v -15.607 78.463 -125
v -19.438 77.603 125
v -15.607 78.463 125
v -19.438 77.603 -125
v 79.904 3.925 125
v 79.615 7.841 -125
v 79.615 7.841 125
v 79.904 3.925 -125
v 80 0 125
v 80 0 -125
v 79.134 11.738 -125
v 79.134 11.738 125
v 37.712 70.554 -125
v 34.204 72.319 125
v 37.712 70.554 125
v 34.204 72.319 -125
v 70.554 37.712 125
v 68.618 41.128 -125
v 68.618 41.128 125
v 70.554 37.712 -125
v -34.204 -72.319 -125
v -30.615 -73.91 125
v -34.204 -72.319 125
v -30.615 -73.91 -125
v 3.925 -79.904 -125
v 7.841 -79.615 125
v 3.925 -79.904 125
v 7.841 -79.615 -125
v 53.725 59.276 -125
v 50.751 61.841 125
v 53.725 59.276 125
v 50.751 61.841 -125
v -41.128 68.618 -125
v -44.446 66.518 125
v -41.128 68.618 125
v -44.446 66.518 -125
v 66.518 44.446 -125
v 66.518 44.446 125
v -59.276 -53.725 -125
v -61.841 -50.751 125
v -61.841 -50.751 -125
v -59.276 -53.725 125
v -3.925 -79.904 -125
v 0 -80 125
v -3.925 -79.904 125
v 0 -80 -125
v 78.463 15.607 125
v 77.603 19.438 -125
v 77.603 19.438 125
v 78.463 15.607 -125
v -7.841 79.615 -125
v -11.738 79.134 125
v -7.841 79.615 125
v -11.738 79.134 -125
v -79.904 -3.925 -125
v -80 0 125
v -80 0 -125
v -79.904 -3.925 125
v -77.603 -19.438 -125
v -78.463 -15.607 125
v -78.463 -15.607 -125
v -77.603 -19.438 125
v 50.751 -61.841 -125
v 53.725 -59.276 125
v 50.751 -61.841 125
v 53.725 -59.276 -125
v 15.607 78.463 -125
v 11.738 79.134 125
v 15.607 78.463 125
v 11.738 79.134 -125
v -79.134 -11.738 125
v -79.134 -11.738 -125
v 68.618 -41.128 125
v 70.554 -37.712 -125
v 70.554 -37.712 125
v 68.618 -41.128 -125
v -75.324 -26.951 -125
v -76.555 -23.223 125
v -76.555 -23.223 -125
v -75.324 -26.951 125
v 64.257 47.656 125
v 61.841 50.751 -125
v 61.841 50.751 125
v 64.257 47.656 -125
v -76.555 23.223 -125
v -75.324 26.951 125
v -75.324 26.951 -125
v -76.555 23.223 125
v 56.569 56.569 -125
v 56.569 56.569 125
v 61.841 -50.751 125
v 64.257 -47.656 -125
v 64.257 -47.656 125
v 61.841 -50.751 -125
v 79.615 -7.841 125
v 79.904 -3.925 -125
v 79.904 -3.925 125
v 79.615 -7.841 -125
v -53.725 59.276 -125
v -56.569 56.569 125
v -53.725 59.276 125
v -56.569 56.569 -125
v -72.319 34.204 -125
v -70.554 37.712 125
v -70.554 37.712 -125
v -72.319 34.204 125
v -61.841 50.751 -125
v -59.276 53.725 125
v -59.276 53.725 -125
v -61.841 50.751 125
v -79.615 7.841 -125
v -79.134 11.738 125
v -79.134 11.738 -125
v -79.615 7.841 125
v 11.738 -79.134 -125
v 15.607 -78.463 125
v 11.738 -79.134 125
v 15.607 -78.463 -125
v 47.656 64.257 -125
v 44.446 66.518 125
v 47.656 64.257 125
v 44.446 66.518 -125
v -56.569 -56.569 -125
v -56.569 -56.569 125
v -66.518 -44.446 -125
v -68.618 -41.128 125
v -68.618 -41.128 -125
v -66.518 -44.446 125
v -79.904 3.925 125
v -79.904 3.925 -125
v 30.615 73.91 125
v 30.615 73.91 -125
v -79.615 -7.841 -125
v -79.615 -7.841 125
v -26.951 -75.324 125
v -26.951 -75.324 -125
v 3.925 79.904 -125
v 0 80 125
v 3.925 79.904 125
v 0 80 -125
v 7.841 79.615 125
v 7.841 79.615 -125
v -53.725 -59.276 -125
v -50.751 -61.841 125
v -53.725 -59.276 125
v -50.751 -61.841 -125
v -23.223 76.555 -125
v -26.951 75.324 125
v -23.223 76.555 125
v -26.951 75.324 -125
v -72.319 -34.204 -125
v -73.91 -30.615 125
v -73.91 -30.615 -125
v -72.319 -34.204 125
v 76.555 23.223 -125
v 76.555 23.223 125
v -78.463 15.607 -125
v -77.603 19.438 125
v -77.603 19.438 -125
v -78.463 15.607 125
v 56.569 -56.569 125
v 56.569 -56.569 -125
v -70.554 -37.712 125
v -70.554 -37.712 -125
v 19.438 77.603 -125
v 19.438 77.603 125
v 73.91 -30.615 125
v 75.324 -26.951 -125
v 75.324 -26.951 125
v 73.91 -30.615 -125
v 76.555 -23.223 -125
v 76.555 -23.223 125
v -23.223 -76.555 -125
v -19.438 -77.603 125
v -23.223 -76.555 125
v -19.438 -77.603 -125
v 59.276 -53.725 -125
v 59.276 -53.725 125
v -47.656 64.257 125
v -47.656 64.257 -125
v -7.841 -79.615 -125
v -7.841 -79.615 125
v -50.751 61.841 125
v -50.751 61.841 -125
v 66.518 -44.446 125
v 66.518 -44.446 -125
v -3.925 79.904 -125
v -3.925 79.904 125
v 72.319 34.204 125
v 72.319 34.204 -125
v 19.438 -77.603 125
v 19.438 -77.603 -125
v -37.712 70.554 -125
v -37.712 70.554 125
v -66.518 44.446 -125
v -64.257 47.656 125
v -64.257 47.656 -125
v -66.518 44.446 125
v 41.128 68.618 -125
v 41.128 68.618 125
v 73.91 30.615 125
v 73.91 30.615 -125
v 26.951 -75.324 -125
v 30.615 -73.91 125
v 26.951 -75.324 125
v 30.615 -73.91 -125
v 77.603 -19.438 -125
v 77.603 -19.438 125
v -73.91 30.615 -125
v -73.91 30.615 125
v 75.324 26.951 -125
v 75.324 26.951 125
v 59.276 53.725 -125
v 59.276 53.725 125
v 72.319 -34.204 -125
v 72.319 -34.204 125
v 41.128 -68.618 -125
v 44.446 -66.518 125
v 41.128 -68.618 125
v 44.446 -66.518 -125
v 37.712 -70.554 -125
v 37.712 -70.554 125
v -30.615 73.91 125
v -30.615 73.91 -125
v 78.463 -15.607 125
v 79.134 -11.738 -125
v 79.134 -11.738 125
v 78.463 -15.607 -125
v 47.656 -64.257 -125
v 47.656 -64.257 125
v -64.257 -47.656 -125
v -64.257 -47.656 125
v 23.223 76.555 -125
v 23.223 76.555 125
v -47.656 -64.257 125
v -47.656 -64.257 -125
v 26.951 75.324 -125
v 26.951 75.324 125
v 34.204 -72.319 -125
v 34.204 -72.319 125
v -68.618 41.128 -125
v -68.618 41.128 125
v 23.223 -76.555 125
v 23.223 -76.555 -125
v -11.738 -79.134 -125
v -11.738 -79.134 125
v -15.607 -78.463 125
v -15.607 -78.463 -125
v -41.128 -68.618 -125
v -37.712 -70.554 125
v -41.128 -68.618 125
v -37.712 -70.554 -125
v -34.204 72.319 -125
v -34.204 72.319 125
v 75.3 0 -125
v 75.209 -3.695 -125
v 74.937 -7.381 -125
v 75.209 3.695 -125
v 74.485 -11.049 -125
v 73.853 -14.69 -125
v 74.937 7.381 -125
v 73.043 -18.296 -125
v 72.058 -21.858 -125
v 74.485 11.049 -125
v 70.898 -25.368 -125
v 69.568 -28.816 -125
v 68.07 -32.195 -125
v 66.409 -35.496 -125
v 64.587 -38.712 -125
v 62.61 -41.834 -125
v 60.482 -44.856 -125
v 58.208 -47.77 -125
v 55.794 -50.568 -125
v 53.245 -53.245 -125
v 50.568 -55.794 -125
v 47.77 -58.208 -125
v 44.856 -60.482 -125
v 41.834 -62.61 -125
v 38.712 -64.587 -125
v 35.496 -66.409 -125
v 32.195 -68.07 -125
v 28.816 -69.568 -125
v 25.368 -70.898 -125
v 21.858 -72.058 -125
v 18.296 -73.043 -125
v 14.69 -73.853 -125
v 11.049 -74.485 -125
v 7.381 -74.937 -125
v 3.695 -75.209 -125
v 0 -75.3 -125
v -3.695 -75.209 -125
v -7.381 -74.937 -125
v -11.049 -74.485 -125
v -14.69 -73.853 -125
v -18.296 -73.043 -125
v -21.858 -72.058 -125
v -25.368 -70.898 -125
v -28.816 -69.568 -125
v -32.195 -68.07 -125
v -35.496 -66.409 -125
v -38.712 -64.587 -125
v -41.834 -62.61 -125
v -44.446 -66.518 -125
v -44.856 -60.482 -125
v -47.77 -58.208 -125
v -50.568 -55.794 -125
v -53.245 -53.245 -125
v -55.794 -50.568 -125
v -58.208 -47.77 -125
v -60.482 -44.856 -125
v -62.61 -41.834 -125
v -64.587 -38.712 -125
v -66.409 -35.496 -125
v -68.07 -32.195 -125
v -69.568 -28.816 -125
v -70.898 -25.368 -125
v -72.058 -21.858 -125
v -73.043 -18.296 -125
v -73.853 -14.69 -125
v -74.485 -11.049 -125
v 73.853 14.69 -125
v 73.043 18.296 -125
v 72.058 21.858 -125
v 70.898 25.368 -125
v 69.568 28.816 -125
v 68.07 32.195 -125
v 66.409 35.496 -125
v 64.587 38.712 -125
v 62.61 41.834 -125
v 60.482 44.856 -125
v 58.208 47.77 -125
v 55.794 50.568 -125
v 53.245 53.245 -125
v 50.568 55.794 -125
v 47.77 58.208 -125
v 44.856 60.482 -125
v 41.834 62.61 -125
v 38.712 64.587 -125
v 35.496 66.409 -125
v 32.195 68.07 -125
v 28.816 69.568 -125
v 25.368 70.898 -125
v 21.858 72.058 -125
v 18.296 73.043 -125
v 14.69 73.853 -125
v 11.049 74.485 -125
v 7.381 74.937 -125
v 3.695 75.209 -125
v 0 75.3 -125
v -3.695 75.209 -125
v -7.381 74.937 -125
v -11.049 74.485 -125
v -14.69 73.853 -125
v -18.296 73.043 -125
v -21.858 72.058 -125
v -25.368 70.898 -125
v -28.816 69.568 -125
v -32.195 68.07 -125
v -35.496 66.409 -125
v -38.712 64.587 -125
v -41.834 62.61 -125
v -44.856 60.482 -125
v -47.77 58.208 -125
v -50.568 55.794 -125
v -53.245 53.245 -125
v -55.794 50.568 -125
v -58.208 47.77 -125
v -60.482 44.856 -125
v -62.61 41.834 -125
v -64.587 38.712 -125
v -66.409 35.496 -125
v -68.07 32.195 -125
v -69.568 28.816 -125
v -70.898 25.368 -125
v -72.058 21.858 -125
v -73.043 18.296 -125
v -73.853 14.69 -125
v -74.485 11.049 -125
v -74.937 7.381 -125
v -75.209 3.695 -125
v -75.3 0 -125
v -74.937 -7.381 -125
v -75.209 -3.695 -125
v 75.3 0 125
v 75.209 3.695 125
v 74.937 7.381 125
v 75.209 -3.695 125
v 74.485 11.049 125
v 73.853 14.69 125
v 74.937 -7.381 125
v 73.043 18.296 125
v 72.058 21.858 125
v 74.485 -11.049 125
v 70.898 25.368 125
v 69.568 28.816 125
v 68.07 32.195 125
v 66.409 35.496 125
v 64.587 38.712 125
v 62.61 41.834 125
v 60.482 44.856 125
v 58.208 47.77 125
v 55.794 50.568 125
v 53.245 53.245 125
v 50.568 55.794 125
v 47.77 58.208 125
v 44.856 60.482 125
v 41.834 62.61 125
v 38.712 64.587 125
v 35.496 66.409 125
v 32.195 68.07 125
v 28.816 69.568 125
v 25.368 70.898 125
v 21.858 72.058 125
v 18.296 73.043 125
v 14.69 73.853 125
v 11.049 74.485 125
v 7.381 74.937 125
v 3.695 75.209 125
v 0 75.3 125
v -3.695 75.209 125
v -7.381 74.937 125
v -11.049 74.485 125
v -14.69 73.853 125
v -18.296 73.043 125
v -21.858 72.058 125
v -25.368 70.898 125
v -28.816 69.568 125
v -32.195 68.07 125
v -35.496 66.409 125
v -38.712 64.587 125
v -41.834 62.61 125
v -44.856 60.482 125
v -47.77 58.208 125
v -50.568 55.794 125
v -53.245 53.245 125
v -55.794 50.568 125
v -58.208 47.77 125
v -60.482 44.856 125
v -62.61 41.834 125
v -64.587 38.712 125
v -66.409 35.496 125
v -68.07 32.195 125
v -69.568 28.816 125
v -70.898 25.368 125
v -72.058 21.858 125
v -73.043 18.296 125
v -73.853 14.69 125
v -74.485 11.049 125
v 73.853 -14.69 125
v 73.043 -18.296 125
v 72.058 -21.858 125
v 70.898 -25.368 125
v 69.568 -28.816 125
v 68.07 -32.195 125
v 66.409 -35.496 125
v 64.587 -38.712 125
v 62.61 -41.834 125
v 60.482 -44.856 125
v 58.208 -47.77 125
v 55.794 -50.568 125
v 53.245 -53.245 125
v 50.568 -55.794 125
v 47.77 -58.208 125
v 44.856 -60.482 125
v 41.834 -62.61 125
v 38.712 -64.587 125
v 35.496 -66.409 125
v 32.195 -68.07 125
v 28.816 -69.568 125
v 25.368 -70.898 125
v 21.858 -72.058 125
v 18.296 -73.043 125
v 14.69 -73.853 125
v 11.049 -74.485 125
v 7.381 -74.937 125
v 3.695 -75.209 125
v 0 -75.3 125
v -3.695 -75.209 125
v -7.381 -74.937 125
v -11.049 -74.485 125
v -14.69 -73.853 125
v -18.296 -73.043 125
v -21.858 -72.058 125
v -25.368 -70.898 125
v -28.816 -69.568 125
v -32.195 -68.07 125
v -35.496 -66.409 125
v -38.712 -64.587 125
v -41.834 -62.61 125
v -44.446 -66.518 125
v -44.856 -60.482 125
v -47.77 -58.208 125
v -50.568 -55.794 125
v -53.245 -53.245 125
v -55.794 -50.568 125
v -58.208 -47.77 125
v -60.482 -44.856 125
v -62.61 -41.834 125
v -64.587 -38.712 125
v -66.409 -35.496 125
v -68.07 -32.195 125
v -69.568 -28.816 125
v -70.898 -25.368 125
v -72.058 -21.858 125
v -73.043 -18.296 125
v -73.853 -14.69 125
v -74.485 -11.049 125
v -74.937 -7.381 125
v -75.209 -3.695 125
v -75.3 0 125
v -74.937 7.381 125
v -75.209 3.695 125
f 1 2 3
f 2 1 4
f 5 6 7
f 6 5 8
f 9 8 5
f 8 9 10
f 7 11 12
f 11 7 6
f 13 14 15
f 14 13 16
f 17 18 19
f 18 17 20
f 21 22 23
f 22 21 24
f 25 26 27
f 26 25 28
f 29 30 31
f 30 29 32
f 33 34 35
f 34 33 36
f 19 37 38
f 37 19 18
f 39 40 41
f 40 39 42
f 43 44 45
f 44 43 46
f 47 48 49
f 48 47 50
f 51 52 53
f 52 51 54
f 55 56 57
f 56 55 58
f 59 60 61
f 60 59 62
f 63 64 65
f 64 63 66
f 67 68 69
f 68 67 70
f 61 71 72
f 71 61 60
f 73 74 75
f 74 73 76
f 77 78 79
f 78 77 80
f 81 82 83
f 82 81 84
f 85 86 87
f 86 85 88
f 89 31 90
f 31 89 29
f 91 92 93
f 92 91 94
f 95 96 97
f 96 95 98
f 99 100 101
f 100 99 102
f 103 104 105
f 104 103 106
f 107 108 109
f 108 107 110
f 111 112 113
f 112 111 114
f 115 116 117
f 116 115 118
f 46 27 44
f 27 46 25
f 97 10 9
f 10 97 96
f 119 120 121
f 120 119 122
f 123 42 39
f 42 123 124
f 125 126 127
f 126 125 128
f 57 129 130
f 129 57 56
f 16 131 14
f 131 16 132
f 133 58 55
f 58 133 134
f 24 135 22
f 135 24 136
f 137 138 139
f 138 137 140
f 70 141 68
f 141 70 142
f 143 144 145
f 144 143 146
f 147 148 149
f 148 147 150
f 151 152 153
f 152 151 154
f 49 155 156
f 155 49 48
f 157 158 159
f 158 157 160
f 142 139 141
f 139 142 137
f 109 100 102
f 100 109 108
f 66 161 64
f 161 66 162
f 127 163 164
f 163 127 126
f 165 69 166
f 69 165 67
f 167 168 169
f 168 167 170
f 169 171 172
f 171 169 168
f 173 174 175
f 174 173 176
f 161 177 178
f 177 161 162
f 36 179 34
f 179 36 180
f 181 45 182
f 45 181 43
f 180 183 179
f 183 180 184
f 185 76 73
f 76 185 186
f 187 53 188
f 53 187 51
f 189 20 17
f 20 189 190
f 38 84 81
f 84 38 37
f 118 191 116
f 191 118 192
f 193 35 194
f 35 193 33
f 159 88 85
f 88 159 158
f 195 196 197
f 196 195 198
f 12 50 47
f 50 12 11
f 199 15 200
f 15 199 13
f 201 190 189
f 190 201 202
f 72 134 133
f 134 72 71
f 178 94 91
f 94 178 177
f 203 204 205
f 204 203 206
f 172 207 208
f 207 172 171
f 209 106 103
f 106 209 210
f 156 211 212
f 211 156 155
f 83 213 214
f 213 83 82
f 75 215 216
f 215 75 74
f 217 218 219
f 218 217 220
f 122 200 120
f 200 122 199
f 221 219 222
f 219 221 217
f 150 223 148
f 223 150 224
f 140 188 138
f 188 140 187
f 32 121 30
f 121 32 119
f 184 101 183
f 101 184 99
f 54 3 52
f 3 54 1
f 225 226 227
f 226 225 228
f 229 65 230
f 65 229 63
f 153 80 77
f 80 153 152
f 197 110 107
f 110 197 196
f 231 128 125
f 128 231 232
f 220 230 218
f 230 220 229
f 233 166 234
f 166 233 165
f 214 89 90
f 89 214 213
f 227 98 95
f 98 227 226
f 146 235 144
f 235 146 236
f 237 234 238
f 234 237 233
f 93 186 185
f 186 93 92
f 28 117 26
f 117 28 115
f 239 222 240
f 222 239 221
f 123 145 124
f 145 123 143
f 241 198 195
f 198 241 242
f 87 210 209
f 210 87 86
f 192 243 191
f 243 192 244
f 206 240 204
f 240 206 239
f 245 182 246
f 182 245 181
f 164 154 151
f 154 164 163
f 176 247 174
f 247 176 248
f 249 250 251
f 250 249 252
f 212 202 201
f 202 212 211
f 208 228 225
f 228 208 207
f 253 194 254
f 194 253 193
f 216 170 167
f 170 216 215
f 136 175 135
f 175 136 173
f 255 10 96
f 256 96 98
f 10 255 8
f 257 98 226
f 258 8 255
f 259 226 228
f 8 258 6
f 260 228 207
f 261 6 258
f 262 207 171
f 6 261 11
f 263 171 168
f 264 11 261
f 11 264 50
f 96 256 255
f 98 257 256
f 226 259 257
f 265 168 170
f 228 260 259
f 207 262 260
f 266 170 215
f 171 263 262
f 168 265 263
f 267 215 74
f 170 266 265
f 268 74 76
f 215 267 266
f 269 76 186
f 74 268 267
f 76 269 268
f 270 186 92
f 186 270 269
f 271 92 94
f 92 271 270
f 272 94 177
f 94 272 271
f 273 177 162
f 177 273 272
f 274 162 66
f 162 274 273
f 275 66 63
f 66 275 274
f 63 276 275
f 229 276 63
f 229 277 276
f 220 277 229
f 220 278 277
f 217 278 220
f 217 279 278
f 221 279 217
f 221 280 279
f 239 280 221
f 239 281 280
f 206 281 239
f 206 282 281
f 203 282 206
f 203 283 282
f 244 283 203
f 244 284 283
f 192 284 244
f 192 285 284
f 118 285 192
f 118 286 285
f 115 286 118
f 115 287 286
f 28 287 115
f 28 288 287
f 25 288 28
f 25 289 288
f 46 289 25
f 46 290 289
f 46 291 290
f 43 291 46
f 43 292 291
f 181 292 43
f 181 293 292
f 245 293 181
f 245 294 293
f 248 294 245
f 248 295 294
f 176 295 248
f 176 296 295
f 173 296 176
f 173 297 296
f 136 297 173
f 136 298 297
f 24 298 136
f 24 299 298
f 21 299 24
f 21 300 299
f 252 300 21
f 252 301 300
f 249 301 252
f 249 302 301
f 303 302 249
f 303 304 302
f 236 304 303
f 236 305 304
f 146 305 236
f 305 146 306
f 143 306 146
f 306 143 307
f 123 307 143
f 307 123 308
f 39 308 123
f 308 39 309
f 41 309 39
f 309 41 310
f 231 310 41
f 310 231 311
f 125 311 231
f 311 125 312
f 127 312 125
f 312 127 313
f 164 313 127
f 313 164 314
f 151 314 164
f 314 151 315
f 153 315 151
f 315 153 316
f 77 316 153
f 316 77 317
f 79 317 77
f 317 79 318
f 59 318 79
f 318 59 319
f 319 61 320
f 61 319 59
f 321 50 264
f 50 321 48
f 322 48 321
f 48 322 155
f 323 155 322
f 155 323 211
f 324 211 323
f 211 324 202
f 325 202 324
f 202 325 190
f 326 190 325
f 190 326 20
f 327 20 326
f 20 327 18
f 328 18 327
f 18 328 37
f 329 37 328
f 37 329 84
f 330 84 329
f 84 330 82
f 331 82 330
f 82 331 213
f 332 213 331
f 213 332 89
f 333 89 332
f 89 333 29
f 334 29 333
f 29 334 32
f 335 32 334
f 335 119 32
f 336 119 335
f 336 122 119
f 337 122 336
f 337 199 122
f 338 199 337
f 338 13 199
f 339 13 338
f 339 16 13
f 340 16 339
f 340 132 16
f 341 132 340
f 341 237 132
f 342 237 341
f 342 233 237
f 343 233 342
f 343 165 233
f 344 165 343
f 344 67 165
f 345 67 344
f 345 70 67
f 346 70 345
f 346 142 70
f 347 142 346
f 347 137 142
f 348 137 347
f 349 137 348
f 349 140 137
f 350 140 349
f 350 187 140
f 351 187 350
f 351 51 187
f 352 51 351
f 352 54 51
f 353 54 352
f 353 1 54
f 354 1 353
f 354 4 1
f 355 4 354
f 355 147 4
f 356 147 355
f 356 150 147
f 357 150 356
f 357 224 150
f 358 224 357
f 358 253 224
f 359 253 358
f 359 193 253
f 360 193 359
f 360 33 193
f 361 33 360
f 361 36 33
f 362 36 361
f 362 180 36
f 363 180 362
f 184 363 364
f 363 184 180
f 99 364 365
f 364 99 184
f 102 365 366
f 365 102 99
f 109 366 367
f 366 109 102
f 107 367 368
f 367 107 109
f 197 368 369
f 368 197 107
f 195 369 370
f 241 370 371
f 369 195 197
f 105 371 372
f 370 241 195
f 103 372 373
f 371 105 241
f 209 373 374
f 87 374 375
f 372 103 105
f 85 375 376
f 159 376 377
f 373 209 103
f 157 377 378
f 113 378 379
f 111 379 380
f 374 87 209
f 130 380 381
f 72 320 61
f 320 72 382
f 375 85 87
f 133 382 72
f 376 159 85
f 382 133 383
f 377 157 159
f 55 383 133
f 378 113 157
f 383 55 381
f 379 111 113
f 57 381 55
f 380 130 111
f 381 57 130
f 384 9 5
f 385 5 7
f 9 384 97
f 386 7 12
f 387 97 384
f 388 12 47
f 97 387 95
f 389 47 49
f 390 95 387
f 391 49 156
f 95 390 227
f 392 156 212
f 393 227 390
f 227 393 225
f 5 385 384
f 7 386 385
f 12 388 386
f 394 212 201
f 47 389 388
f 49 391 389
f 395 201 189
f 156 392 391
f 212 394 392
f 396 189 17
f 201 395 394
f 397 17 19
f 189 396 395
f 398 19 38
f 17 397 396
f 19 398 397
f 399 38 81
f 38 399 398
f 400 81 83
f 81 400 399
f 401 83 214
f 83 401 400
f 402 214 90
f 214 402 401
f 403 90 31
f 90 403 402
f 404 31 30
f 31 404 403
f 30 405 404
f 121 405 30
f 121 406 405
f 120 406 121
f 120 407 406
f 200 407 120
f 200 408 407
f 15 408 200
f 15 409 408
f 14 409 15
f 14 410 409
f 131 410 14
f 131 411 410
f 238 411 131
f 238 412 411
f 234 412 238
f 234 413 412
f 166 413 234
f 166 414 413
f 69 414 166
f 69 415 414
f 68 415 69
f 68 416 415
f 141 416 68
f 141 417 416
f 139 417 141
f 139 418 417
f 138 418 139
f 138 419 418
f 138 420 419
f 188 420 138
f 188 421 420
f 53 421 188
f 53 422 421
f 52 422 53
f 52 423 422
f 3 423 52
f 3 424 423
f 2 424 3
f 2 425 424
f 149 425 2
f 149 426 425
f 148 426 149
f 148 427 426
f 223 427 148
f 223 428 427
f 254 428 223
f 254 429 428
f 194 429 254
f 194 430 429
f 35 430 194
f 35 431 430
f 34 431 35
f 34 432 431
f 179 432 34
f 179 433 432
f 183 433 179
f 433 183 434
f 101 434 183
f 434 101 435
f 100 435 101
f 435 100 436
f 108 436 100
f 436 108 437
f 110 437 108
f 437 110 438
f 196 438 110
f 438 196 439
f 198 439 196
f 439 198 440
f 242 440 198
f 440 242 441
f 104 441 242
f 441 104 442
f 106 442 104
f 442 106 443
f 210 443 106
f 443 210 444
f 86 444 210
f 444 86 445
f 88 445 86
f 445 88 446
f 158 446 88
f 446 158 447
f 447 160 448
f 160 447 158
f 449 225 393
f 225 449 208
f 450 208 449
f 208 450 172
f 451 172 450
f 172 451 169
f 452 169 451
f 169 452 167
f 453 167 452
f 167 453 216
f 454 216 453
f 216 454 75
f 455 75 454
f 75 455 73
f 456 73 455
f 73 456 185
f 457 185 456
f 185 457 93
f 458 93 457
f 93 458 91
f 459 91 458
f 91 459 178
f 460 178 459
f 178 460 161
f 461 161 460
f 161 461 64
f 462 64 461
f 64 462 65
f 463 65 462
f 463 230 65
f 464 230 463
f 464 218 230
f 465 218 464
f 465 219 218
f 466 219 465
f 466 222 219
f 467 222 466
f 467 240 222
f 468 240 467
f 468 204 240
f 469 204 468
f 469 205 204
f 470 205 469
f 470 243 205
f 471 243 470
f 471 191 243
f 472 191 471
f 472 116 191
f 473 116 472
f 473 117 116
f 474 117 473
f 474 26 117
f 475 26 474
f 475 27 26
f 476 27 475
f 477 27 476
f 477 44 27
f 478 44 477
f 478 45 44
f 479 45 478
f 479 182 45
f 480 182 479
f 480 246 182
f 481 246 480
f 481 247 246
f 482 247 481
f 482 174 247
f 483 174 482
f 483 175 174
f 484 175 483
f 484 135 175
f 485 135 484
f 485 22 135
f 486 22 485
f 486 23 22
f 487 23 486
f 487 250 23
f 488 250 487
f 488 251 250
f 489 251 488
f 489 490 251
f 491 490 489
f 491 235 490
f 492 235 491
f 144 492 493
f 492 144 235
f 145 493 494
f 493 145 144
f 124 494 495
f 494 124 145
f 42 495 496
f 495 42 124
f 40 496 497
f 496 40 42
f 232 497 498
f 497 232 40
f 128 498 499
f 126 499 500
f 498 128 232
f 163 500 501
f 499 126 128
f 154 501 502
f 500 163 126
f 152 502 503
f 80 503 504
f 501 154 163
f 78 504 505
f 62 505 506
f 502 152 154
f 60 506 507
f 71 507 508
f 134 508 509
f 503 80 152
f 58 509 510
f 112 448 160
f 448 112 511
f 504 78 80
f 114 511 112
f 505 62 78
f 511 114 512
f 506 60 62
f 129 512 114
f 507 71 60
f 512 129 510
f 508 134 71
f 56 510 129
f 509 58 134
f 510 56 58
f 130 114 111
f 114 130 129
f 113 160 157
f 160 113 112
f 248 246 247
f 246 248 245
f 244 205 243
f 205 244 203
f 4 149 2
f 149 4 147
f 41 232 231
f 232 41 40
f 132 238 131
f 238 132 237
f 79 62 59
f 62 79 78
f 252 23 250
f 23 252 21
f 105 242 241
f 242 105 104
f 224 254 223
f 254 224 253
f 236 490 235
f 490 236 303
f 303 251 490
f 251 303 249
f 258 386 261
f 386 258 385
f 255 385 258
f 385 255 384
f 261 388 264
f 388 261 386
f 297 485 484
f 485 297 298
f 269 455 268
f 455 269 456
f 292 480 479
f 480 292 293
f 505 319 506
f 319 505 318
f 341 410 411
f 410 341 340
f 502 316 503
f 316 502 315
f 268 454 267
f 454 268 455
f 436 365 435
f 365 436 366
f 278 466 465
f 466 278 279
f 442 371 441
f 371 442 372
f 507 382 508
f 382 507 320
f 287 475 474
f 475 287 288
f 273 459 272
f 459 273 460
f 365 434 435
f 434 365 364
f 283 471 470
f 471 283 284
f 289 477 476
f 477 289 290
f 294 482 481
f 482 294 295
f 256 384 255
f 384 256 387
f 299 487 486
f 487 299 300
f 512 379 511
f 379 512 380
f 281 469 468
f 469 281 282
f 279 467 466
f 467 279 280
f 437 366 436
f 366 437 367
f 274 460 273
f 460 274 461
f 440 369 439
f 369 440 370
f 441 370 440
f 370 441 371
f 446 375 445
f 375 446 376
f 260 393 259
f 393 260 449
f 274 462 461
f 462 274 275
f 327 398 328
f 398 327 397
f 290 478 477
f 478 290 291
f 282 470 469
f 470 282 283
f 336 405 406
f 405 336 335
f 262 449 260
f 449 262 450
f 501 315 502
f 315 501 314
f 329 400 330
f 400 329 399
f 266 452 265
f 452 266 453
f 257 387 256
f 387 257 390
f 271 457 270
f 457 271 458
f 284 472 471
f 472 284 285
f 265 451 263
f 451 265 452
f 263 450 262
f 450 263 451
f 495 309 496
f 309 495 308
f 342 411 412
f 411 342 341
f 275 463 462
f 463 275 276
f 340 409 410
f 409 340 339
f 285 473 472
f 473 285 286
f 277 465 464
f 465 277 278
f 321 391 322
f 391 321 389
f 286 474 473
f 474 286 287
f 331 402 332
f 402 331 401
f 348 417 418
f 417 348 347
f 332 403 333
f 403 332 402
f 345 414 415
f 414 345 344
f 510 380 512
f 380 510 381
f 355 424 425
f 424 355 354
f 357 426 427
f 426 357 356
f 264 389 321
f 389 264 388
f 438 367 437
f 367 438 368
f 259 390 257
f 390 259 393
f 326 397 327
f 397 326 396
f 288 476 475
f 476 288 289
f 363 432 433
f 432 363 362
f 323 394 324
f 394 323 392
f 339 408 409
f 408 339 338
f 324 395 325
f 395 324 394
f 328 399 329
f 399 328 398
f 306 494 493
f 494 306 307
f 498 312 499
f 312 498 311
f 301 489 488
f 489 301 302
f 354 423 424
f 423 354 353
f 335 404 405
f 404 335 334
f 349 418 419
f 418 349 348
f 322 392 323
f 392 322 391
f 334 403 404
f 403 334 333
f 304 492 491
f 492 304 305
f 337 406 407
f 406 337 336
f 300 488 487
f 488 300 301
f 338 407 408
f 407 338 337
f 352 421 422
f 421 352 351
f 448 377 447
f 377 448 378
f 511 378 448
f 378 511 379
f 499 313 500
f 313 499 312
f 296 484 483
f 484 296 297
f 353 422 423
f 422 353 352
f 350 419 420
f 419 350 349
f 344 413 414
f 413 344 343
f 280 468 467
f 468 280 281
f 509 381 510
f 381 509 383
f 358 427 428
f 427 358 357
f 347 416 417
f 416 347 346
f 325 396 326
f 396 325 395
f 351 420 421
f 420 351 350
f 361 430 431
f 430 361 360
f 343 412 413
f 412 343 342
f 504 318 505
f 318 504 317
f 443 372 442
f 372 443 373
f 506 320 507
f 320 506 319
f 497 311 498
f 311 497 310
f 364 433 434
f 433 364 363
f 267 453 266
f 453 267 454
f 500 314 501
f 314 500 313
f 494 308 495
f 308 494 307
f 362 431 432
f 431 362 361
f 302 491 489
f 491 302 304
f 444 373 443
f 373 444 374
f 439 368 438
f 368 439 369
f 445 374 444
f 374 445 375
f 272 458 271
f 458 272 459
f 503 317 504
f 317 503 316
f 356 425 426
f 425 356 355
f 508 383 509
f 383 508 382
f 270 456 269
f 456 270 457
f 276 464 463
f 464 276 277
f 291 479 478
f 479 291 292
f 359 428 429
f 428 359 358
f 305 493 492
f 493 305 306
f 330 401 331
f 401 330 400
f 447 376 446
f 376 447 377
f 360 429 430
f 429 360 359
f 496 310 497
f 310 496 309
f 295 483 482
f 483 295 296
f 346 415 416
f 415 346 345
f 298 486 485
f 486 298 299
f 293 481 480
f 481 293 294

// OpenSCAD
$fn=128;

module ht_pipe(od=160, length=250, wall=4.7) {
    difference() {
        cylinder(h=length, d=od, center=true);
        cylinder(h=length+2, d=od-2*wall, center=true);
    }
}

ht_pipe(od=160, length=250, wall=4.7);
